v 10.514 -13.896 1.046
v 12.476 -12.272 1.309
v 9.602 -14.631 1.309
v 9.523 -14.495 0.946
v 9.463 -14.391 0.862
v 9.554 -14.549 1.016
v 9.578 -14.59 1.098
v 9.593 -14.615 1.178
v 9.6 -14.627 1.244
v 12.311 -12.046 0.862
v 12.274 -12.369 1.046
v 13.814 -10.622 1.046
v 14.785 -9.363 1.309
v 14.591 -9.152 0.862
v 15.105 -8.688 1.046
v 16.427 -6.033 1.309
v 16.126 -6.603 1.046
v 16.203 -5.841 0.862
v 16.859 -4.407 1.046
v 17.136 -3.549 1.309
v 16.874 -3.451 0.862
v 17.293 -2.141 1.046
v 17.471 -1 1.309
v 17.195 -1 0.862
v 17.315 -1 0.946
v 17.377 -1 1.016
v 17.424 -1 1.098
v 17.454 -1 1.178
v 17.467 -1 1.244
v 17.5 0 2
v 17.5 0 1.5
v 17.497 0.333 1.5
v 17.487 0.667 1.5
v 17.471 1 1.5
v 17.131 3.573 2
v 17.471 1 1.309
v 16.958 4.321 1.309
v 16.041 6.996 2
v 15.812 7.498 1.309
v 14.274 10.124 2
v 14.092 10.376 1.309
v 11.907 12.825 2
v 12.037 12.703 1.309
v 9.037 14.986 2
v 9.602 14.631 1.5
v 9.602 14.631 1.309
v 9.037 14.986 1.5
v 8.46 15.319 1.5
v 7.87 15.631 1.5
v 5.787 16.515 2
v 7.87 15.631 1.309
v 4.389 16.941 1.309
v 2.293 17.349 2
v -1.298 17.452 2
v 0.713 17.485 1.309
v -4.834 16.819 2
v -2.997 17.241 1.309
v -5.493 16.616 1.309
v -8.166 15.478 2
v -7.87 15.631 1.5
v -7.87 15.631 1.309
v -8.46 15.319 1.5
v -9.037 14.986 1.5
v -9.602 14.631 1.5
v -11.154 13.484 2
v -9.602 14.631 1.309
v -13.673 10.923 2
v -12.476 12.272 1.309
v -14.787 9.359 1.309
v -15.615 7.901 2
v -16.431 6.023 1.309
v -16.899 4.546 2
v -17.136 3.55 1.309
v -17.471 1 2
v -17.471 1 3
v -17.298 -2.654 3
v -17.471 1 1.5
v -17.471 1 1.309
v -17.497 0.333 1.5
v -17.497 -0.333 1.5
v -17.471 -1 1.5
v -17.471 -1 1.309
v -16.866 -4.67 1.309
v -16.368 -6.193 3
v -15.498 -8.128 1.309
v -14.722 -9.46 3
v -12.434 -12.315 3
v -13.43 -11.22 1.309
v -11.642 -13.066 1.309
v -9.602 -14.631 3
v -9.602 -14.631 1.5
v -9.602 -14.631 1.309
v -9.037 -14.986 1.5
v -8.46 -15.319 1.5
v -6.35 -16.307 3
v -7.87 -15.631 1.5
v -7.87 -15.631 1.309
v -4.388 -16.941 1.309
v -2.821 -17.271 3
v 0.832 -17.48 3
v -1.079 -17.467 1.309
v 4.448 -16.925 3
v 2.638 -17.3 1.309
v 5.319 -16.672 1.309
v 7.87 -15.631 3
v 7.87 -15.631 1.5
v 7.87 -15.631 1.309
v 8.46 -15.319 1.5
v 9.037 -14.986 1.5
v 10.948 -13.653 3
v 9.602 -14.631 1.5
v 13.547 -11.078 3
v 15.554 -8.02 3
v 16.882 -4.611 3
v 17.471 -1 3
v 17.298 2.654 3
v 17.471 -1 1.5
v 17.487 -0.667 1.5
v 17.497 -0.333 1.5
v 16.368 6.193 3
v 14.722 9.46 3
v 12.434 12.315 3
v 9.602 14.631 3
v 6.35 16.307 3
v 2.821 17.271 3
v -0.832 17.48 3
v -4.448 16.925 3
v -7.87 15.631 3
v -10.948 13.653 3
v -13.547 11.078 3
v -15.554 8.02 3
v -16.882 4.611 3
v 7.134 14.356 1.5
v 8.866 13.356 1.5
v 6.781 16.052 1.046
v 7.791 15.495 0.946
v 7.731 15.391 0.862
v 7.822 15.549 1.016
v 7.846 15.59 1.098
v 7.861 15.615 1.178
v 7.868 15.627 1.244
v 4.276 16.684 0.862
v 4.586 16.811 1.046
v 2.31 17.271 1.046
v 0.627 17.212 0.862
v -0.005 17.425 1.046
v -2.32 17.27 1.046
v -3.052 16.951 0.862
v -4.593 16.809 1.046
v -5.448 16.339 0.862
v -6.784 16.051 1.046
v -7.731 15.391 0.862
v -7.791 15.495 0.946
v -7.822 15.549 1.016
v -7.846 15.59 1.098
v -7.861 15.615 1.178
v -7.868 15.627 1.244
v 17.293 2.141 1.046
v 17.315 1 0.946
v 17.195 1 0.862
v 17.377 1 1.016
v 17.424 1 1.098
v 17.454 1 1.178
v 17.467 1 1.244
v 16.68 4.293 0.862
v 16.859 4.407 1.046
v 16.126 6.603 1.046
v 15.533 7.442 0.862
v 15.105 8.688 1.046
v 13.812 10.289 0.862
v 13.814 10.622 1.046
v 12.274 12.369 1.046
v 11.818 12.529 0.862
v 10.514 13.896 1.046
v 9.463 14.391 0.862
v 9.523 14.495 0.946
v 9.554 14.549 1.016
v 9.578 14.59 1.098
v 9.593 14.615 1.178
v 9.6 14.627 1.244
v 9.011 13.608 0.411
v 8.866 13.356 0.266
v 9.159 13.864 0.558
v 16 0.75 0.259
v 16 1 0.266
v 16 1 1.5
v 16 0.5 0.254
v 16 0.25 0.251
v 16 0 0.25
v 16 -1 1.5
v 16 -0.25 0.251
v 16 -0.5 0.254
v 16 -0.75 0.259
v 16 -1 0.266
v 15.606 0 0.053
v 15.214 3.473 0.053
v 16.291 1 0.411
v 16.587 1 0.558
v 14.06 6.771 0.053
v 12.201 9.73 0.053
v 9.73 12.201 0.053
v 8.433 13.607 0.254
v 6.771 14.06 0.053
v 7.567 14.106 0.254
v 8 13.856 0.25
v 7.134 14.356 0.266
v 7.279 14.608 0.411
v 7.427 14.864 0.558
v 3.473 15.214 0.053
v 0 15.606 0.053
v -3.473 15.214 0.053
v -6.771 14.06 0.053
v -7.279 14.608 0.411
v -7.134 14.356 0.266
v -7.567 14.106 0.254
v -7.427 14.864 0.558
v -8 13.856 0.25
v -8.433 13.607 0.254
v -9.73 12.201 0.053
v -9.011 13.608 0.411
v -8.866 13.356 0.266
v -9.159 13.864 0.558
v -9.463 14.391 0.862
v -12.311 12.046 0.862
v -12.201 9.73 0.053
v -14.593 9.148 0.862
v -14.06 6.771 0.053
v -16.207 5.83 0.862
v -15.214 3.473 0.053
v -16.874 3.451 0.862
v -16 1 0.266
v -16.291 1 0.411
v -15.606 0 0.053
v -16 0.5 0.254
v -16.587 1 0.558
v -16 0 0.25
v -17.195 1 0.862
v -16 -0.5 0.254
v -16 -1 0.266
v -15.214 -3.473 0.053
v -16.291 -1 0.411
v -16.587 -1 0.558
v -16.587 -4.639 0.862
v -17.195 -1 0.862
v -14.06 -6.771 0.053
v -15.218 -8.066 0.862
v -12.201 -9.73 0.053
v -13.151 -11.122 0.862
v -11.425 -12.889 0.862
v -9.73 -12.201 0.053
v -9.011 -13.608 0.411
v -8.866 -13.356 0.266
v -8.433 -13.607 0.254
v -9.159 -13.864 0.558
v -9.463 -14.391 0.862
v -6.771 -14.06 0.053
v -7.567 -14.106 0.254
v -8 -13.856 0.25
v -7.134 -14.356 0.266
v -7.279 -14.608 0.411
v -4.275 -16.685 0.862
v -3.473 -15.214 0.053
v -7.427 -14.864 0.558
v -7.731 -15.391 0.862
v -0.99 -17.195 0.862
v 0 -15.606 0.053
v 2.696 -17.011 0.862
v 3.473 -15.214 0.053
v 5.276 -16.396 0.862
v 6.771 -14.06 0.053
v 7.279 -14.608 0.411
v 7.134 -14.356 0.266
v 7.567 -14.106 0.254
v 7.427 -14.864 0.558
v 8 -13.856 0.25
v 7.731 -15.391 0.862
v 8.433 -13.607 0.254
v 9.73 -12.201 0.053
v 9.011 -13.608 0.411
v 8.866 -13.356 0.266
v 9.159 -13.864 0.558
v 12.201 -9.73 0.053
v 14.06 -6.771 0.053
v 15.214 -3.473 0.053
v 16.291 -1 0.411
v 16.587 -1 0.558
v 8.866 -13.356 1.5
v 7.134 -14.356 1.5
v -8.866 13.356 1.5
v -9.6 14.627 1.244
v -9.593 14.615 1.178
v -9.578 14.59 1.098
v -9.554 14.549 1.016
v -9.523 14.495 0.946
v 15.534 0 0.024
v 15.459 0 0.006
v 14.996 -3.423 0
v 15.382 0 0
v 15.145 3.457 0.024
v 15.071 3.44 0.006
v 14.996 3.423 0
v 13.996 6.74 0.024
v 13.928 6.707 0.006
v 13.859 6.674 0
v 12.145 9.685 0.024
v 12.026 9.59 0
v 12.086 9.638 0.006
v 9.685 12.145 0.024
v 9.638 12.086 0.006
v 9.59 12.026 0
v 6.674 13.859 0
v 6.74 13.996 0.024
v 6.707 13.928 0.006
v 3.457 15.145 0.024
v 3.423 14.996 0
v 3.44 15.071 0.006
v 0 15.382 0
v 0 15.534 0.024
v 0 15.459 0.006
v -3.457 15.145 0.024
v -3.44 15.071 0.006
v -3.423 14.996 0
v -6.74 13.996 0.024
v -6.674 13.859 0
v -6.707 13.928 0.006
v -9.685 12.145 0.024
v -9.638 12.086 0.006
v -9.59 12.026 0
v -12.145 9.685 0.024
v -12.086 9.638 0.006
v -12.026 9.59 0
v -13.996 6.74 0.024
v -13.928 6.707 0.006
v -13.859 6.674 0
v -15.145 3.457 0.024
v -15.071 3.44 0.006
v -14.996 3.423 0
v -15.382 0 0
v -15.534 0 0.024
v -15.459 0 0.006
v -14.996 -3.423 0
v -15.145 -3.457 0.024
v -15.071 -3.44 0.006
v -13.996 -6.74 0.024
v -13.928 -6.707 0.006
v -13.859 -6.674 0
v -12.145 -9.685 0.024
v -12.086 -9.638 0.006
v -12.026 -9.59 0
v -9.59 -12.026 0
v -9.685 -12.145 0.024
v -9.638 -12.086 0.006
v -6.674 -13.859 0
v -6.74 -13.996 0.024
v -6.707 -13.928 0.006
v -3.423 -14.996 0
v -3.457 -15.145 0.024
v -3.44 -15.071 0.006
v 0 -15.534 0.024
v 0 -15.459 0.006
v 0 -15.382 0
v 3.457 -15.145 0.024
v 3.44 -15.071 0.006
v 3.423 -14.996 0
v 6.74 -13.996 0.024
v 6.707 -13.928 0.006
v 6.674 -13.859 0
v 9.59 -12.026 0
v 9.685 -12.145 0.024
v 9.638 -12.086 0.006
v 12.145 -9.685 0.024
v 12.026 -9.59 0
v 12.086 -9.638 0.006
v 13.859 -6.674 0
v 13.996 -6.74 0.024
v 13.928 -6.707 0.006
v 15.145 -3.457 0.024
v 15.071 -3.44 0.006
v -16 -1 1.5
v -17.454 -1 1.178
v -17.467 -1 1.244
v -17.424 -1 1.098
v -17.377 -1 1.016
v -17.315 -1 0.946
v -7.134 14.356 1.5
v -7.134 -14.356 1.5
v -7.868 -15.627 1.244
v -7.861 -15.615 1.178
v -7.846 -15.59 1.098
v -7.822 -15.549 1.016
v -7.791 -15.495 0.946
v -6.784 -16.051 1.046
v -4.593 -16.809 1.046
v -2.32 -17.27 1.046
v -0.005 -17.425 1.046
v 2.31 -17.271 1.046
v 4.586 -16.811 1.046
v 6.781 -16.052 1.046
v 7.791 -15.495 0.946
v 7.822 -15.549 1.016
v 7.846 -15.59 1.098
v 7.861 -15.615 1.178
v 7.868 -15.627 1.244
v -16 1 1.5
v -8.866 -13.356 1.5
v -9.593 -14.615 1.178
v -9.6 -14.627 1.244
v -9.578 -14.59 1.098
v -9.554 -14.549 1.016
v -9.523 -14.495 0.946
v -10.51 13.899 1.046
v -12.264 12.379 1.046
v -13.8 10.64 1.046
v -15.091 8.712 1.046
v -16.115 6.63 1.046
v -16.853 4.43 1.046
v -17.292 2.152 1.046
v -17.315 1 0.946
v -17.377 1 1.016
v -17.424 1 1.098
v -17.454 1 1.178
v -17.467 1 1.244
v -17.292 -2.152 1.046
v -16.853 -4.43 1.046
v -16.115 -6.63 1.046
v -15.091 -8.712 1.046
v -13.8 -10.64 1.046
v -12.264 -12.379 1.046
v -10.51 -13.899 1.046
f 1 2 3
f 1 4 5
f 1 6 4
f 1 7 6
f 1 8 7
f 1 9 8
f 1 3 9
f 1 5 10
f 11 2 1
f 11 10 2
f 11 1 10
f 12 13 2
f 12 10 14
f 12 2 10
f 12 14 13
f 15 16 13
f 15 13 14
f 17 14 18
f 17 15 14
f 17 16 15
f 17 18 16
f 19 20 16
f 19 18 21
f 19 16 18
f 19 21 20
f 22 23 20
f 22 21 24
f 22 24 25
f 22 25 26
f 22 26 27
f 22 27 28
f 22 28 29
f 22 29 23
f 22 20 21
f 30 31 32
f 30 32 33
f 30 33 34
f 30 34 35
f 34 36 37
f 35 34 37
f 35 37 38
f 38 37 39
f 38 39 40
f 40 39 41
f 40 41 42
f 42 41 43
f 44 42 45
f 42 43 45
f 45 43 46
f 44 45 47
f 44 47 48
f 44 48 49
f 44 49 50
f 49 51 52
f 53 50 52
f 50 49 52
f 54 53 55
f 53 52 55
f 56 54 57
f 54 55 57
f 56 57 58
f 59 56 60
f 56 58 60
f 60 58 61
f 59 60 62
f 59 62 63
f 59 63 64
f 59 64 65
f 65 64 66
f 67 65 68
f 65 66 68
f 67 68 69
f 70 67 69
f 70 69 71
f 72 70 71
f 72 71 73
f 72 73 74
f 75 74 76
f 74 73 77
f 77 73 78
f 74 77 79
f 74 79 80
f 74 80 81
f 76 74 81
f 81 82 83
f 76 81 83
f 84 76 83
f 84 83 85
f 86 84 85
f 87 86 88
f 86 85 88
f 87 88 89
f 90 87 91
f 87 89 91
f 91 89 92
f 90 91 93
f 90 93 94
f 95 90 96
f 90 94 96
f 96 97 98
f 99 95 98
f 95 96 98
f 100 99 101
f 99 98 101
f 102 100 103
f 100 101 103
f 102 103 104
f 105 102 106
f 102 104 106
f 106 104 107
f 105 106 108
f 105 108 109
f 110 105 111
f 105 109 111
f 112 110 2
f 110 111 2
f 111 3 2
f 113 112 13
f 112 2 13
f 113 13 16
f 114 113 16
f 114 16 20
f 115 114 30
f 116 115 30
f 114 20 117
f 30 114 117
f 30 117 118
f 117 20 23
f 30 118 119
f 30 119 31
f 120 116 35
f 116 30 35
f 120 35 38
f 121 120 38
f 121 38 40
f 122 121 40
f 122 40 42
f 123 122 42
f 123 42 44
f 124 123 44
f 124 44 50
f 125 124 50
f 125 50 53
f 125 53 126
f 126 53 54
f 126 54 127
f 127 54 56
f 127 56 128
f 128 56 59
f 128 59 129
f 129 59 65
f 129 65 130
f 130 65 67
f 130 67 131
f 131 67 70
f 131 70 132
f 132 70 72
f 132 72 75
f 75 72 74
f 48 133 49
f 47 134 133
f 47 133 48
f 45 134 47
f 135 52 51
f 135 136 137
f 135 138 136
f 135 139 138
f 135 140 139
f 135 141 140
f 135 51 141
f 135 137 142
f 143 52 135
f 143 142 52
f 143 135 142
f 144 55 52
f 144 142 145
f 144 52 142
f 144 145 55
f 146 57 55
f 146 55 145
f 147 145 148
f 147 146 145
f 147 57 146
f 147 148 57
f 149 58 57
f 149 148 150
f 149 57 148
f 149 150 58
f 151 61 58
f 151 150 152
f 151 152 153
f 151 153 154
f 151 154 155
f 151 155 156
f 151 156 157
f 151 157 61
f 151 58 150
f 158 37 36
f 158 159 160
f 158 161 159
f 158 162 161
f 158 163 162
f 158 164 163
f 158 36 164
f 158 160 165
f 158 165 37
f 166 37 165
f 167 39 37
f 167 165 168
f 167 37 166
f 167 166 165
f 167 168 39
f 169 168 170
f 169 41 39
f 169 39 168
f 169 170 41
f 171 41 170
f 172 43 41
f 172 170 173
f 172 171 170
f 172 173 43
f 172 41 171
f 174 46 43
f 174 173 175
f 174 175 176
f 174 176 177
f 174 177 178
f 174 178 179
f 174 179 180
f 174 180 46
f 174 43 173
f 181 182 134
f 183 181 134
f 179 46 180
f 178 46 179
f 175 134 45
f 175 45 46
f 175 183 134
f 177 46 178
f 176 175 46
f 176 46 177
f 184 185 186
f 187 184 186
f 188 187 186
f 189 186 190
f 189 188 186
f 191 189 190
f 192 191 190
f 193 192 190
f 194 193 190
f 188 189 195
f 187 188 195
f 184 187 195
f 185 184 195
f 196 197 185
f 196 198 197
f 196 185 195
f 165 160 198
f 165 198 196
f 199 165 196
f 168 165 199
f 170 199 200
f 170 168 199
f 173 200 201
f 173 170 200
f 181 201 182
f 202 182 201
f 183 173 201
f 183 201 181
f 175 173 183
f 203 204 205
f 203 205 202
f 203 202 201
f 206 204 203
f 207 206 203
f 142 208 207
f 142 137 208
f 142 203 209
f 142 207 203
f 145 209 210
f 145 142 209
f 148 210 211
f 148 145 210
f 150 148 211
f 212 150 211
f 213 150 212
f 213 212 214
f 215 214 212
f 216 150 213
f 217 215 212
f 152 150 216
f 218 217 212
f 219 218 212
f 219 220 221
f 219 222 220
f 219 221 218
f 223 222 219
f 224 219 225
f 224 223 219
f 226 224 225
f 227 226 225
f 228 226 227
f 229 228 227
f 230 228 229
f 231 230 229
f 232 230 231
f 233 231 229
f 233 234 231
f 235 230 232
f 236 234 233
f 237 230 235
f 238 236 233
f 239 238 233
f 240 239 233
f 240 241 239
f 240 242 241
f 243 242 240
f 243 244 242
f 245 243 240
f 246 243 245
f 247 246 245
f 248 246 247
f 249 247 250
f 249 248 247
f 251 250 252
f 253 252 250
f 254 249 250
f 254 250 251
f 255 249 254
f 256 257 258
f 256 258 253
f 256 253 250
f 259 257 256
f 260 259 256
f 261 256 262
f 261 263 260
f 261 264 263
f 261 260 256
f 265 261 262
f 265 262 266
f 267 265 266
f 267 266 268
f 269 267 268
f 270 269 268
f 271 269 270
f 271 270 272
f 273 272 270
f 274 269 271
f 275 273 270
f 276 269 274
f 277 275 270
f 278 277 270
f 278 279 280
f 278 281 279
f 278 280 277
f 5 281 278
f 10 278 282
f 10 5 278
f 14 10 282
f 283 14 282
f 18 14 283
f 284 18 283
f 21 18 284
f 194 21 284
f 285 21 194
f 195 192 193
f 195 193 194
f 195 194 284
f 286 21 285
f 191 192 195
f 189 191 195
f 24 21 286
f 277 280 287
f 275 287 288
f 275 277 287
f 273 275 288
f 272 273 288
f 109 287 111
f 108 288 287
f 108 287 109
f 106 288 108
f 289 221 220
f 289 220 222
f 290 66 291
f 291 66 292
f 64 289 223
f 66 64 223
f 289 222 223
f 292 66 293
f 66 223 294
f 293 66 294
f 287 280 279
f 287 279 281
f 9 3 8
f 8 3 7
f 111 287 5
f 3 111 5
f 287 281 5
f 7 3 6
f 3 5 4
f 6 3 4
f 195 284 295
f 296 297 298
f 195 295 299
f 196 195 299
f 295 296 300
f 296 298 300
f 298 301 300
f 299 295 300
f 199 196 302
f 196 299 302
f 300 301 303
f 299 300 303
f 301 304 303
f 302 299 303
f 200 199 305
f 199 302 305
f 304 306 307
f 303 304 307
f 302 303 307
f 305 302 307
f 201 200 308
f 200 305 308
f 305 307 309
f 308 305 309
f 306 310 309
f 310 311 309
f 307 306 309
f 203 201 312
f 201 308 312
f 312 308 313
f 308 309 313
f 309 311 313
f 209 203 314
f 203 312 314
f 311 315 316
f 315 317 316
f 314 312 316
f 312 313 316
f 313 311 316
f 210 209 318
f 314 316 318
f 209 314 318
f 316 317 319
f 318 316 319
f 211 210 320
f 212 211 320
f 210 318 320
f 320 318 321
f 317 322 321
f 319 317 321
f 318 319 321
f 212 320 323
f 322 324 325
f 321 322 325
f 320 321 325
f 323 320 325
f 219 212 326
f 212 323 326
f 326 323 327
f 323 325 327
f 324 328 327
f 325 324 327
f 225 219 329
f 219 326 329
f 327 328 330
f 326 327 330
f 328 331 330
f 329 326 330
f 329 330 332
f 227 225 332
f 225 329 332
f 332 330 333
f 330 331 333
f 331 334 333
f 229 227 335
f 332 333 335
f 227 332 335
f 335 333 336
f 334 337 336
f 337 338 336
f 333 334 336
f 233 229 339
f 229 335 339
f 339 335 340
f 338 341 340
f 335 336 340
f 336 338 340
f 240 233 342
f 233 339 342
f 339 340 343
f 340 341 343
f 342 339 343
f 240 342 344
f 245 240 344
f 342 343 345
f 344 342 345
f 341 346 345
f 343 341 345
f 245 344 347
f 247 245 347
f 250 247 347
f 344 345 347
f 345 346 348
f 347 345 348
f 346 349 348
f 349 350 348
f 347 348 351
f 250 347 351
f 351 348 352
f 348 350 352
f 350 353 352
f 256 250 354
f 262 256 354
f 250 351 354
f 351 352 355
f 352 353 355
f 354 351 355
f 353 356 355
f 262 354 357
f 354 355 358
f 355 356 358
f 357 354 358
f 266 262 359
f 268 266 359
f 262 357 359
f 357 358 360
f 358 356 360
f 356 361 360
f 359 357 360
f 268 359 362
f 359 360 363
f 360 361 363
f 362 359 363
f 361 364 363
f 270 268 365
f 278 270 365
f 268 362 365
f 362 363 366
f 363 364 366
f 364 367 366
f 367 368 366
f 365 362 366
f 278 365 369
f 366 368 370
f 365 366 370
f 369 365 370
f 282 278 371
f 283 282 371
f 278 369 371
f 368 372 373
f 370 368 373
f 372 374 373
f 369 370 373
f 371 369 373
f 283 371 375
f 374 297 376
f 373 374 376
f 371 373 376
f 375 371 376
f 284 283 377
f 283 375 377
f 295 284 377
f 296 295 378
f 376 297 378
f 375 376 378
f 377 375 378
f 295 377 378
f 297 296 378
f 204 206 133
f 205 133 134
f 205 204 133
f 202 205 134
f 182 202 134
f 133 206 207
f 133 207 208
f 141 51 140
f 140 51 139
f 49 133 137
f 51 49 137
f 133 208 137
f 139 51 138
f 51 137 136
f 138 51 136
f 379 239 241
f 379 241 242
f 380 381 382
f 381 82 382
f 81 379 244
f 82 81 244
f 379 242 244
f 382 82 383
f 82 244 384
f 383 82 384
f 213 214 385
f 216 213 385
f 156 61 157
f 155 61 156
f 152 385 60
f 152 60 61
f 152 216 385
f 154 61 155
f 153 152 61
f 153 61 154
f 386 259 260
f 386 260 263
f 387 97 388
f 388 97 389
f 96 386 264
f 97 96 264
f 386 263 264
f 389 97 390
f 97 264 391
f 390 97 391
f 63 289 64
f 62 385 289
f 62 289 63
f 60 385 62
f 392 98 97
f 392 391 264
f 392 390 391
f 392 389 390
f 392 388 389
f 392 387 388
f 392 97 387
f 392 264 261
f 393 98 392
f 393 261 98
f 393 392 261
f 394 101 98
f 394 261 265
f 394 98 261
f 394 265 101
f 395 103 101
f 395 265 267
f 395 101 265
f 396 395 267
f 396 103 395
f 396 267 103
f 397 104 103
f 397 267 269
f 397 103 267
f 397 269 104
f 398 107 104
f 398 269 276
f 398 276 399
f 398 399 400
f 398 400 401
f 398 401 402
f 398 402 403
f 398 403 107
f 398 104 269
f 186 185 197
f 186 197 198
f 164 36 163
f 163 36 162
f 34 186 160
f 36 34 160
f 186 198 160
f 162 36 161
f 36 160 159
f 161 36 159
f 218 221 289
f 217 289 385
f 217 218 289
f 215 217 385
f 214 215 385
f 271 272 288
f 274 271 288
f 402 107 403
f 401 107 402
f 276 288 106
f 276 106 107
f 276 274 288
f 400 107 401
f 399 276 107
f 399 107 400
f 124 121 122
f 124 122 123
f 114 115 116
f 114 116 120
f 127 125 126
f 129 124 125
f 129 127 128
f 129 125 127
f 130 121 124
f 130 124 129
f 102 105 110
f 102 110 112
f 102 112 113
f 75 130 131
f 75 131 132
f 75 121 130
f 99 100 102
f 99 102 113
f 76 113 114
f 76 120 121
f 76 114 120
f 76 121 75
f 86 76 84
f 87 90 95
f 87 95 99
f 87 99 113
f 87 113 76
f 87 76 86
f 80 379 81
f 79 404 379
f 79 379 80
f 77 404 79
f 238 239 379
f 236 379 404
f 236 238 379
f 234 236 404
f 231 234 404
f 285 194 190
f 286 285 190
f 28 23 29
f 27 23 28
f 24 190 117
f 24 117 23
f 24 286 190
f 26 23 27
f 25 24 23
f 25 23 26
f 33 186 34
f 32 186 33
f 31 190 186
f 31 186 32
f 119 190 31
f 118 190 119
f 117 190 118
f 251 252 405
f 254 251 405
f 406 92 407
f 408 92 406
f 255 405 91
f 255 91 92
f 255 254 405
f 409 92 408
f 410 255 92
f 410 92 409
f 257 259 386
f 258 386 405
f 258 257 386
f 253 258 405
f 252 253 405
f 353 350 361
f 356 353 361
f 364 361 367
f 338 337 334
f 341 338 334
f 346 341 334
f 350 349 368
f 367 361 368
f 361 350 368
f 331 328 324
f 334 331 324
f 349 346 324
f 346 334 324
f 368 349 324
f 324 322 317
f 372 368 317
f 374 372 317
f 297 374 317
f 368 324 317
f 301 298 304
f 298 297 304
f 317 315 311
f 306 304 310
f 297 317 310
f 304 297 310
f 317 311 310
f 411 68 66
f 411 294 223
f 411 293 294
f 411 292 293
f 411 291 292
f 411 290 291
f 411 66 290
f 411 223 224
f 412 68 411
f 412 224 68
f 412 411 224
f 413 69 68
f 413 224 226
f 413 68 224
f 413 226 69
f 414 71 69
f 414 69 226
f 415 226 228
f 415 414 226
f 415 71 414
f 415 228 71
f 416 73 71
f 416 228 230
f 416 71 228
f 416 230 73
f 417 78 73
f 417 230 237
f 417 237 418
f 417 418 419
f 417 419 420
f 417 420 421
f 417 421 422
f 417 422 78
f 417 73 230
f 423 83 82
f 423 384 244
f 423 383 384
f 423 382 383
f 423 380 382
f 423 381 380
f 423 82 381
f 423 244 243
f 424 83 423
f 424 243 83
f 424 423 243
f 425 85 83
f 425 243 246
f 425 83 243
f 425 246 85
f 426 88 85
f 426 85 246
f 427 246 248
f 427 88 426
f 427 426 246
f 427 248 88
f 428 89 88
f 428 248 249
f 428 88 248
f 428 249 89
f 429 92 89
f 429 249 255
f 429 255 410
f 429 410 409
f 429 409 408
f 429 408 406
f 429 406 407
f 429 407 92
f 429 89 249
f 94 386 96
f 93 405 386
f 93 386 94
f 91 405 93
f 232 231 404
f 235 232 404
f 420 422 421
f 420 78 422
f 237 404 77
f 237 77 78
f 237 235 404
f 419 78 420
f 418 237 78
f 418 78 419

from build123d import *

# Parameters (mm, degrees)
SKETCH1_R           = 17.5
BASE_EXTRUDE_DEPTH  = 2
CHAMFER1_SIZE       = 2
CHAMFER1_SIZE2      = 1
FILLET8_R           = 0.5
SKETCH2_W           = 4
SKETCH2_H           = 2
CUT_EXTRUDE1_DEPTH  = 1.5
CIRPATTERN1_COUNT   = 6
SKETCH3_R           = 17.5
BOSS_EXTRUDE1_DEPTH = 1


with BuildPart() as part:
    # Sketch1 → Base-Extrude (new body)
    with BuildSketch(Plane.XY):
        Circle(SKETCH1_R)
    extrude(amount=BASE_EXTRUDE_DEPTH)

    # Chamfer1
    chamfer1_edges = [part.edges().sort_by_distance(p)[0] for p in [
        (-17.5, 0, 0),
    ]]
    chamfer1_side = [part.faces().sort_by_distance(p)[0] for p in [
        (0, 0, 0),
    ]]
    chamfer(chamfer1_edges, length=CHAMFER1_SIZE, length2=CHAMFER1_SIZE2, reference=chamfer1_side[0])

    # Fillet8
    fillet8_edges = [part.edges().sort_by_distance(p)[0] for p in [
        (-17.5, 0, 1),
        (-15.5, 0, 0),
    ]]
    fillet(fillet8_edges, radius=FILLET8_R)

    # Sketch2 → Cut-Extrude1 (cut)
    with BuildSketch(Plane(origin=(0, 0, 0), x_dir=(-1, 0, 0), z_dir=(0, 0, -1))):
        with Locations((18, 0)):
            Rectangle(SKETCH2_W, SKETCH2_H)
    cut_extrude1 = extrude(amount=-CUT_EXTRUDE1_DEPTH, mode=Mode.SUBTRACT)

    # CirPattern1: Cut-Extrude1 ×6 about axis
    cirpattern1_axis = Axis((0, 0, 0), (0, 0, -1))
    for i in range(1, CIRPATTERN1_COUNT):
        add(cut_extrude1.rotate(cirpattern1_axis, i * 360 / CIRPATTERN1_COUNT), mode=Mode.SUBTRACT)

    # Sketch3 → Boss-Extrude1 (add)
    with BuildSketch(Plane.XY.offset(2)):
        Circle(SKETCH3_R)
    extrude(amount=BOSS_EXTRUDE1_DEPTH)


solid = part.part
